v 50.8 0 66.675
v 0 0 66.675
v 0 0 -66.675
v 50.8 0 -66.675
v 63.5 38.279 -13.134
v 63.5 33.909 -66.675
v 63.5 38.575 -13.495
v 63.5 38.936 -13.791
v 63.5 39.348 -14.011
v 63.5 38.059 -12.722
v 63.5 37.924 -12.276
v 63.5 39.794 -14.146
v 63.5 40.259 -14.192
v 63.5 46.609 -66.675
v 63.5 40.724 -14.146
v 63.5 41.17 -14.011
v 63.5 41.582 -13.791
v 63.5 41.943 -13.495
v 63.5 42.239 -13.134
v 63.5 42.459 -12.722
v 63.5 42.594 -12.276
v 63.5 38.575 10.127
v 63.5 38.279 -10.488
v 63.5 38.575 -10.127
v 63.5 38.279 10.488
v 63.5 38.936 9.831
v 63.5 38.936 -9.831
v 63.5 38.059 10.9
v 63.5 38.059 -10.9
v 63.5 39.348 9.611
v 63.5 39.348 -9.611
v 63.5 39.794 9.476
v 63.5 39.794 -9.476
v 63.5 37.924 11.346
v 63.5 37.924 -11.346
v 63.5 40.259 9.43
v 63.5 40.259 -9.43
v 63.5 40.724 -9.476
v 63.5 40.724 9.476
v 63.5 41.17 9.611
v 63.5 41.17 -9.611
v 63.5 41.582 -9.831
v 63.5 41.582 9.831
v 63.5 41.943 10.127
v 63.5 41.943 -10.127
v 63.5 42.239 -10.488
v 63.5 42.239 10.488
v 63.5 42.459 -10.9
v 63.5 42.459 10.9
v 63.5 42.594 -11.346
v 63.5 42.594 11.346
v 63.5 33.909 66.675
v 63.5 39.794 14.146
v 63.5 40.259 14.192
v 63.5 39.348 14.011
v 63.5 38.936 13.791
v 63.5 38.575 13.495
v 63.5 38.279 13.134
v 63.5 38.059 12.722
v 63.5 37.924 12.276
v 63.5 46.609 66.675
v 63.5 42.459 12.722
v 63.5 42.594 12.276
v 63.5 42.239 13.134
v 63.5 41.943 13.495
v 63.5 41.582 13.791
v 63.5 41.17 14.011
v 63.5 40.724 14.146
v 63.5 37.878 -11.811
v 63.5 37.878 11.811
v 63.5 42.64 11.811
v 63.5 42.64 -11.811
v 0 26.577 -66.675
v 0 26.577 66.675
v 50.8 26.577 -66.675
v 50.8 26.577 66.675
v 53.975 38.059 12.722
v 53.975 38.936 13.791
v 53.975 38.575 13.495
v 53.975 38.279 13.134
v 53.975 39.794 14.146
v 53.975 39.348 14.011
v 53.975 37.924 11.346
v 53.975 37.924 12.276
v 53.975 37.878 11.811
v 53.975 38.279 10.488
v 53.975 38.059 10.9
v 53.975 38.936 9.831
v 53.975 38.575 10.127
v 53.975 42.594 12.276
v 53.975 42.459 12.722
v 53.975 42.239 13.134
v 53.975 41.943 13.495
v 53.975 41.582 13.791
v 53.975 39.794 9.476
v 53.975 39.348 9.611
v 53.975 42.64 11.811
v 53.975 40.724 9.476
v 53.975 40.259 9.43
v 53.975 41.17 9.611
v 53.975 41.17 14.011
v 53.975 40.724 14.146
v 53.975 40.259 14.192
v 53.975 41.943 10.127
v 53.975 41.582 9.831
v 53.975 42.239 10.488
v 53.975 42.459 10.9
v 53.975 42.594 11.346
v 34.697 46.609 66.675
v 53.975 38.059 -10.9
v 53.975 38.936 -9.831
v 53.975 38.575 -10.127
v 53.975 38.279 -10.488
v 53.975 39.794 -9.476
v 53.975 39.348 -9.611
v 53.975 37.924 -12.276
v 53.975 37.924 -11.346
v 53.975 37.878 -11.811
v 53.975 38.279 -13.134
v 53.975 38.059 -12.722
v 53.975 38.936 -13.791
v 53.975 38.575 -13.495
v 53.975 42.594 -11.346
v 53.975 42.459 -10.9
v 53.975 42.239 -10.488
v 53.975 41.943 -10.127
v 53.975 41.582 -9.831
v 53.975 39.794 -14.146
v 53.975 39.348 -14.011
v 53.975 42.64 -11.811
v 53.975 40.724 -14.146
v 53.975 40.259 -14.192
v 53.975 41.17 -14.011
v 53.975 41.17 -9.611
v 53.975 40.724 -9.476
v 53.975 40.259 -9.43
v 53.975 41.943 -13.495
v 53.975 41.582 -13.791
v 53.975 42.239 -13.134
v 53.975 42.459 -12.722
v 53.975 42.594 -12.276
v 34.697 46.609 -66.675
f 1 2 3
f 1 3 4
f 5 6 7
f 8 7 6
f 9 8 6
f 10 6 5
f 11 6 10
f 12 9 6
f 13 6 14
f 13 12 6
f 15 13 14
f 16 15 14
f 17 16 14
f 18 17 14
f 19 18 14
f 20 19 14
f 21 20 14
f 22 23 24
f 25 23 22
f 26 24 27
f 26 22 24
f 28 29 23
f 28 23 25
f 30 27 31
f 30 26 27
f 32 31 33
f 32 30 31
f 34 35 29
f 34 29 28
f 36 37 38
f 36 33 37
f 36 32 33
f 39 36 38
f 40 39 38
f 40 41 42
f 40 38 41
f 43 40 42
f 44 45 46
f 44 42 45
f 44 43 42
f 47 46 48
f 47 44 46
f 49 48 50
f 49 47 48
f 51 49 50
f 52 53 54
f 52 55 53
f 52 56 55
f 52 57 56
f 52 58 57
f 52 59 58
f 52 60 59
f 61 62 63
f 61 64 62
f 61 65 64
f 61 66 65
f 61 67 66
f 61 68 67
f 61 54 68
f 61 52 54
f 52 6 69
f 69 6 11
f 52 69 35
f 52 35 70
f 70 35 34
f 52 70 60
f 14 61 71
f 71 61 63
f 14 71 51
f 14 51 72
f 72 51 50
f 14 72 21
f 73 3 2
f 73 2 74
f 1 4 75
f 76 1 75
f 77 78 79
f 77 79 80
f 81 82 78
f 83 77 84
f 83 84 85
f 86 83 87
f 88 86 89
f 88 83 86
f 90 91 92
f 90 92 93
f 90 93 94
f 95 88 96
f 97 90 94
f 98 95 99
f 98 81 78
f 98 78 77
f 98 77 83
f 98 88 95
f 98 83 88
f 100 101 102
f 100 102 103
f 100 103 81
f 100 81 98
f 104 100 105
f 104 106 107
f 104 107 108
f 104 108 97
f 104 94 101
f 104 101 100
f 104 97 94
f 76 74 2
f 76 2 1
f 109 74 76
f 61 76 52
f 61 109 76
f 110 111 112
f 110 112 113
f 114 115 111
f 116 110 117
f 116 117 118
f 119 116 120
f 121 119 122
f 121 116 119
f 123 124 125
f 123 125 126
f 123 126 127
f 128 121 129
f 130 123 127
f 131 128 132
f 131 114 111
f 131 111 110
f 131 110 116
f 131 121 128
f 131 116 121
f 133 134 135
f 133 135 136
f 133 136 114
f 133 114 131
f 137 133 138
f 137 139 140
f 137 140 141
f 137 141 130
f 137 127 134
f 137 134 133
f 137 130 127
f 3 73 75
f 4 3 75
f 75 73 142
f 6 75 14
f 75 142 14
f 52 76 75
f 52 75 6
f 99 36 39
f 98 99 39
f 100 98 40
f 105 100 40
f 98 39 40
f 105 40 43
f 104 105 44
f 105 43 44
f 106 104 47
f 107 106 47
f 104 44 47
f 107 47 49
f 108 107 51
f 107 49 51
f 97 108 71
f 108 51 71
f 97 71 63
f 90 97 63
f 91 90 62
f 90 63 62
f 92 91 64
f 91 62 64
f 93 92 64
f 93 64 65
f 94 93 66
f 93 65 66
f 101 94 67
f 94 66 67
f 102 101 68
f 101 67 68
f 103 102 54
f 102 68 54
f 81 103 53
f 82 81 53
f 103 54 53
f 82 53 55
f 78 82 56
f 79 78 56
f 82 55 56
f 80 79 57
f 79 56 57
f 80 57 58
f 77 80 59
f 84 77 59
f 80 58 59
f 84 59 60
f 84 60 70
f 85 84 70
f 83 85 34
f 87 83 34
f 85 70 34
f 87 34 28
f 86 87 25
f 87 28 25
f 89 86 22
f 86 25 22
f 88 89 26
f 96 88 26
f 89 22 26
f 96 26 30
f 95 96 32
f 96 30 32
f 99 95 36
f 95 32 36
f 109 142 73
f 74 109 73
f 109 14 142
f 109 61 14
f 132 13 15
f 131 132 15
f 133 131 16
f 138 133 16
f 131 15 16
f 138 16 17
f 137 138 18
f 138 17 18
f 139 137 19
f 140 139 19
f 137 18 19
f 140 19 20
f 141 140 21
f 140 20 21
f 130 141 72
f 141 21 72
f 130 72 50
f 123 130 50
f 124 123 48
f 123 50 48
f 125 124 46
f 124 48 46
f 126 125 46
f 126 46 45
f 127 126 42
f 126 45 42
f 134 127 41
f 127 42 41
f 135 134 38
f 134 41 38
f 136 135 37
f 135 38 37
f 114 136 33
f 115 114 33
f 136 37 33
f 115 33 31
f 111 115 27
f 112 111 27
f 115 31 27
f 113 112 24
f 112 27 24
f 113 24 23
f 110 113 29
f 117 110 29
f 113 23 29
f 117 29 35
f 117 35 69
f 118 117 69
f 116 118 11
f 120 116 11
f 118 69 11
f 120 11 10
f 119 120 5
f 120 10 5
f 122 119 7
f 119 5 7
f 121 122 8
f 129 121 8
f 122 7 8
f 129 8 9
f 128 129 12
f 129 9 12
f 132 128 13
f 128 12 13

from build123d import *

# Parameters (mm, degrees)
SKETCH1_W           = 50.8
SKETCH1_H           = 26.576651581
BOSS_EXTRUDE1_DEPTH = 66.675
SKETCH3_R           = 2.38125
CUT_EXTRUDE1_DEPTH  = 9.525


with BuildPart() as part:
    # Sketch1 → Boss-Extrude1 (new body, symmetric)
    with BuildSketch(Plane.XY):
        with Locations((25.4, 13.288325791)):
            Rectangle(SKETCH1_W, SKETCH1_H)
        Polygon((34.697045256, 46.609), (0, 26.576651581), (50.8, 26.576651581), (63.5, 33.909), (63.5, 46.609), align=None)
    extrude(amount=BOSS_EXTRUDE1_DEPTH, both=True)

    # Sketch3 → Cut-Extrude1 (cut)
    with BuildSketch(Plane(origin=(63.5, 0, 0), x_dir=(0, 0, -1), z_dir=(1, 0, 0))):
        with Locations((-11.811, 40.259)):
            Circle(SKETCH3_R)
        with Locations((11.811, 40.259)):
            Circle(SKETCH3_R)
    extrude(amount=-CUT_EXTRUDE1_DEPTH, mode=Mode.SUBTRACT)


solid = part.part
